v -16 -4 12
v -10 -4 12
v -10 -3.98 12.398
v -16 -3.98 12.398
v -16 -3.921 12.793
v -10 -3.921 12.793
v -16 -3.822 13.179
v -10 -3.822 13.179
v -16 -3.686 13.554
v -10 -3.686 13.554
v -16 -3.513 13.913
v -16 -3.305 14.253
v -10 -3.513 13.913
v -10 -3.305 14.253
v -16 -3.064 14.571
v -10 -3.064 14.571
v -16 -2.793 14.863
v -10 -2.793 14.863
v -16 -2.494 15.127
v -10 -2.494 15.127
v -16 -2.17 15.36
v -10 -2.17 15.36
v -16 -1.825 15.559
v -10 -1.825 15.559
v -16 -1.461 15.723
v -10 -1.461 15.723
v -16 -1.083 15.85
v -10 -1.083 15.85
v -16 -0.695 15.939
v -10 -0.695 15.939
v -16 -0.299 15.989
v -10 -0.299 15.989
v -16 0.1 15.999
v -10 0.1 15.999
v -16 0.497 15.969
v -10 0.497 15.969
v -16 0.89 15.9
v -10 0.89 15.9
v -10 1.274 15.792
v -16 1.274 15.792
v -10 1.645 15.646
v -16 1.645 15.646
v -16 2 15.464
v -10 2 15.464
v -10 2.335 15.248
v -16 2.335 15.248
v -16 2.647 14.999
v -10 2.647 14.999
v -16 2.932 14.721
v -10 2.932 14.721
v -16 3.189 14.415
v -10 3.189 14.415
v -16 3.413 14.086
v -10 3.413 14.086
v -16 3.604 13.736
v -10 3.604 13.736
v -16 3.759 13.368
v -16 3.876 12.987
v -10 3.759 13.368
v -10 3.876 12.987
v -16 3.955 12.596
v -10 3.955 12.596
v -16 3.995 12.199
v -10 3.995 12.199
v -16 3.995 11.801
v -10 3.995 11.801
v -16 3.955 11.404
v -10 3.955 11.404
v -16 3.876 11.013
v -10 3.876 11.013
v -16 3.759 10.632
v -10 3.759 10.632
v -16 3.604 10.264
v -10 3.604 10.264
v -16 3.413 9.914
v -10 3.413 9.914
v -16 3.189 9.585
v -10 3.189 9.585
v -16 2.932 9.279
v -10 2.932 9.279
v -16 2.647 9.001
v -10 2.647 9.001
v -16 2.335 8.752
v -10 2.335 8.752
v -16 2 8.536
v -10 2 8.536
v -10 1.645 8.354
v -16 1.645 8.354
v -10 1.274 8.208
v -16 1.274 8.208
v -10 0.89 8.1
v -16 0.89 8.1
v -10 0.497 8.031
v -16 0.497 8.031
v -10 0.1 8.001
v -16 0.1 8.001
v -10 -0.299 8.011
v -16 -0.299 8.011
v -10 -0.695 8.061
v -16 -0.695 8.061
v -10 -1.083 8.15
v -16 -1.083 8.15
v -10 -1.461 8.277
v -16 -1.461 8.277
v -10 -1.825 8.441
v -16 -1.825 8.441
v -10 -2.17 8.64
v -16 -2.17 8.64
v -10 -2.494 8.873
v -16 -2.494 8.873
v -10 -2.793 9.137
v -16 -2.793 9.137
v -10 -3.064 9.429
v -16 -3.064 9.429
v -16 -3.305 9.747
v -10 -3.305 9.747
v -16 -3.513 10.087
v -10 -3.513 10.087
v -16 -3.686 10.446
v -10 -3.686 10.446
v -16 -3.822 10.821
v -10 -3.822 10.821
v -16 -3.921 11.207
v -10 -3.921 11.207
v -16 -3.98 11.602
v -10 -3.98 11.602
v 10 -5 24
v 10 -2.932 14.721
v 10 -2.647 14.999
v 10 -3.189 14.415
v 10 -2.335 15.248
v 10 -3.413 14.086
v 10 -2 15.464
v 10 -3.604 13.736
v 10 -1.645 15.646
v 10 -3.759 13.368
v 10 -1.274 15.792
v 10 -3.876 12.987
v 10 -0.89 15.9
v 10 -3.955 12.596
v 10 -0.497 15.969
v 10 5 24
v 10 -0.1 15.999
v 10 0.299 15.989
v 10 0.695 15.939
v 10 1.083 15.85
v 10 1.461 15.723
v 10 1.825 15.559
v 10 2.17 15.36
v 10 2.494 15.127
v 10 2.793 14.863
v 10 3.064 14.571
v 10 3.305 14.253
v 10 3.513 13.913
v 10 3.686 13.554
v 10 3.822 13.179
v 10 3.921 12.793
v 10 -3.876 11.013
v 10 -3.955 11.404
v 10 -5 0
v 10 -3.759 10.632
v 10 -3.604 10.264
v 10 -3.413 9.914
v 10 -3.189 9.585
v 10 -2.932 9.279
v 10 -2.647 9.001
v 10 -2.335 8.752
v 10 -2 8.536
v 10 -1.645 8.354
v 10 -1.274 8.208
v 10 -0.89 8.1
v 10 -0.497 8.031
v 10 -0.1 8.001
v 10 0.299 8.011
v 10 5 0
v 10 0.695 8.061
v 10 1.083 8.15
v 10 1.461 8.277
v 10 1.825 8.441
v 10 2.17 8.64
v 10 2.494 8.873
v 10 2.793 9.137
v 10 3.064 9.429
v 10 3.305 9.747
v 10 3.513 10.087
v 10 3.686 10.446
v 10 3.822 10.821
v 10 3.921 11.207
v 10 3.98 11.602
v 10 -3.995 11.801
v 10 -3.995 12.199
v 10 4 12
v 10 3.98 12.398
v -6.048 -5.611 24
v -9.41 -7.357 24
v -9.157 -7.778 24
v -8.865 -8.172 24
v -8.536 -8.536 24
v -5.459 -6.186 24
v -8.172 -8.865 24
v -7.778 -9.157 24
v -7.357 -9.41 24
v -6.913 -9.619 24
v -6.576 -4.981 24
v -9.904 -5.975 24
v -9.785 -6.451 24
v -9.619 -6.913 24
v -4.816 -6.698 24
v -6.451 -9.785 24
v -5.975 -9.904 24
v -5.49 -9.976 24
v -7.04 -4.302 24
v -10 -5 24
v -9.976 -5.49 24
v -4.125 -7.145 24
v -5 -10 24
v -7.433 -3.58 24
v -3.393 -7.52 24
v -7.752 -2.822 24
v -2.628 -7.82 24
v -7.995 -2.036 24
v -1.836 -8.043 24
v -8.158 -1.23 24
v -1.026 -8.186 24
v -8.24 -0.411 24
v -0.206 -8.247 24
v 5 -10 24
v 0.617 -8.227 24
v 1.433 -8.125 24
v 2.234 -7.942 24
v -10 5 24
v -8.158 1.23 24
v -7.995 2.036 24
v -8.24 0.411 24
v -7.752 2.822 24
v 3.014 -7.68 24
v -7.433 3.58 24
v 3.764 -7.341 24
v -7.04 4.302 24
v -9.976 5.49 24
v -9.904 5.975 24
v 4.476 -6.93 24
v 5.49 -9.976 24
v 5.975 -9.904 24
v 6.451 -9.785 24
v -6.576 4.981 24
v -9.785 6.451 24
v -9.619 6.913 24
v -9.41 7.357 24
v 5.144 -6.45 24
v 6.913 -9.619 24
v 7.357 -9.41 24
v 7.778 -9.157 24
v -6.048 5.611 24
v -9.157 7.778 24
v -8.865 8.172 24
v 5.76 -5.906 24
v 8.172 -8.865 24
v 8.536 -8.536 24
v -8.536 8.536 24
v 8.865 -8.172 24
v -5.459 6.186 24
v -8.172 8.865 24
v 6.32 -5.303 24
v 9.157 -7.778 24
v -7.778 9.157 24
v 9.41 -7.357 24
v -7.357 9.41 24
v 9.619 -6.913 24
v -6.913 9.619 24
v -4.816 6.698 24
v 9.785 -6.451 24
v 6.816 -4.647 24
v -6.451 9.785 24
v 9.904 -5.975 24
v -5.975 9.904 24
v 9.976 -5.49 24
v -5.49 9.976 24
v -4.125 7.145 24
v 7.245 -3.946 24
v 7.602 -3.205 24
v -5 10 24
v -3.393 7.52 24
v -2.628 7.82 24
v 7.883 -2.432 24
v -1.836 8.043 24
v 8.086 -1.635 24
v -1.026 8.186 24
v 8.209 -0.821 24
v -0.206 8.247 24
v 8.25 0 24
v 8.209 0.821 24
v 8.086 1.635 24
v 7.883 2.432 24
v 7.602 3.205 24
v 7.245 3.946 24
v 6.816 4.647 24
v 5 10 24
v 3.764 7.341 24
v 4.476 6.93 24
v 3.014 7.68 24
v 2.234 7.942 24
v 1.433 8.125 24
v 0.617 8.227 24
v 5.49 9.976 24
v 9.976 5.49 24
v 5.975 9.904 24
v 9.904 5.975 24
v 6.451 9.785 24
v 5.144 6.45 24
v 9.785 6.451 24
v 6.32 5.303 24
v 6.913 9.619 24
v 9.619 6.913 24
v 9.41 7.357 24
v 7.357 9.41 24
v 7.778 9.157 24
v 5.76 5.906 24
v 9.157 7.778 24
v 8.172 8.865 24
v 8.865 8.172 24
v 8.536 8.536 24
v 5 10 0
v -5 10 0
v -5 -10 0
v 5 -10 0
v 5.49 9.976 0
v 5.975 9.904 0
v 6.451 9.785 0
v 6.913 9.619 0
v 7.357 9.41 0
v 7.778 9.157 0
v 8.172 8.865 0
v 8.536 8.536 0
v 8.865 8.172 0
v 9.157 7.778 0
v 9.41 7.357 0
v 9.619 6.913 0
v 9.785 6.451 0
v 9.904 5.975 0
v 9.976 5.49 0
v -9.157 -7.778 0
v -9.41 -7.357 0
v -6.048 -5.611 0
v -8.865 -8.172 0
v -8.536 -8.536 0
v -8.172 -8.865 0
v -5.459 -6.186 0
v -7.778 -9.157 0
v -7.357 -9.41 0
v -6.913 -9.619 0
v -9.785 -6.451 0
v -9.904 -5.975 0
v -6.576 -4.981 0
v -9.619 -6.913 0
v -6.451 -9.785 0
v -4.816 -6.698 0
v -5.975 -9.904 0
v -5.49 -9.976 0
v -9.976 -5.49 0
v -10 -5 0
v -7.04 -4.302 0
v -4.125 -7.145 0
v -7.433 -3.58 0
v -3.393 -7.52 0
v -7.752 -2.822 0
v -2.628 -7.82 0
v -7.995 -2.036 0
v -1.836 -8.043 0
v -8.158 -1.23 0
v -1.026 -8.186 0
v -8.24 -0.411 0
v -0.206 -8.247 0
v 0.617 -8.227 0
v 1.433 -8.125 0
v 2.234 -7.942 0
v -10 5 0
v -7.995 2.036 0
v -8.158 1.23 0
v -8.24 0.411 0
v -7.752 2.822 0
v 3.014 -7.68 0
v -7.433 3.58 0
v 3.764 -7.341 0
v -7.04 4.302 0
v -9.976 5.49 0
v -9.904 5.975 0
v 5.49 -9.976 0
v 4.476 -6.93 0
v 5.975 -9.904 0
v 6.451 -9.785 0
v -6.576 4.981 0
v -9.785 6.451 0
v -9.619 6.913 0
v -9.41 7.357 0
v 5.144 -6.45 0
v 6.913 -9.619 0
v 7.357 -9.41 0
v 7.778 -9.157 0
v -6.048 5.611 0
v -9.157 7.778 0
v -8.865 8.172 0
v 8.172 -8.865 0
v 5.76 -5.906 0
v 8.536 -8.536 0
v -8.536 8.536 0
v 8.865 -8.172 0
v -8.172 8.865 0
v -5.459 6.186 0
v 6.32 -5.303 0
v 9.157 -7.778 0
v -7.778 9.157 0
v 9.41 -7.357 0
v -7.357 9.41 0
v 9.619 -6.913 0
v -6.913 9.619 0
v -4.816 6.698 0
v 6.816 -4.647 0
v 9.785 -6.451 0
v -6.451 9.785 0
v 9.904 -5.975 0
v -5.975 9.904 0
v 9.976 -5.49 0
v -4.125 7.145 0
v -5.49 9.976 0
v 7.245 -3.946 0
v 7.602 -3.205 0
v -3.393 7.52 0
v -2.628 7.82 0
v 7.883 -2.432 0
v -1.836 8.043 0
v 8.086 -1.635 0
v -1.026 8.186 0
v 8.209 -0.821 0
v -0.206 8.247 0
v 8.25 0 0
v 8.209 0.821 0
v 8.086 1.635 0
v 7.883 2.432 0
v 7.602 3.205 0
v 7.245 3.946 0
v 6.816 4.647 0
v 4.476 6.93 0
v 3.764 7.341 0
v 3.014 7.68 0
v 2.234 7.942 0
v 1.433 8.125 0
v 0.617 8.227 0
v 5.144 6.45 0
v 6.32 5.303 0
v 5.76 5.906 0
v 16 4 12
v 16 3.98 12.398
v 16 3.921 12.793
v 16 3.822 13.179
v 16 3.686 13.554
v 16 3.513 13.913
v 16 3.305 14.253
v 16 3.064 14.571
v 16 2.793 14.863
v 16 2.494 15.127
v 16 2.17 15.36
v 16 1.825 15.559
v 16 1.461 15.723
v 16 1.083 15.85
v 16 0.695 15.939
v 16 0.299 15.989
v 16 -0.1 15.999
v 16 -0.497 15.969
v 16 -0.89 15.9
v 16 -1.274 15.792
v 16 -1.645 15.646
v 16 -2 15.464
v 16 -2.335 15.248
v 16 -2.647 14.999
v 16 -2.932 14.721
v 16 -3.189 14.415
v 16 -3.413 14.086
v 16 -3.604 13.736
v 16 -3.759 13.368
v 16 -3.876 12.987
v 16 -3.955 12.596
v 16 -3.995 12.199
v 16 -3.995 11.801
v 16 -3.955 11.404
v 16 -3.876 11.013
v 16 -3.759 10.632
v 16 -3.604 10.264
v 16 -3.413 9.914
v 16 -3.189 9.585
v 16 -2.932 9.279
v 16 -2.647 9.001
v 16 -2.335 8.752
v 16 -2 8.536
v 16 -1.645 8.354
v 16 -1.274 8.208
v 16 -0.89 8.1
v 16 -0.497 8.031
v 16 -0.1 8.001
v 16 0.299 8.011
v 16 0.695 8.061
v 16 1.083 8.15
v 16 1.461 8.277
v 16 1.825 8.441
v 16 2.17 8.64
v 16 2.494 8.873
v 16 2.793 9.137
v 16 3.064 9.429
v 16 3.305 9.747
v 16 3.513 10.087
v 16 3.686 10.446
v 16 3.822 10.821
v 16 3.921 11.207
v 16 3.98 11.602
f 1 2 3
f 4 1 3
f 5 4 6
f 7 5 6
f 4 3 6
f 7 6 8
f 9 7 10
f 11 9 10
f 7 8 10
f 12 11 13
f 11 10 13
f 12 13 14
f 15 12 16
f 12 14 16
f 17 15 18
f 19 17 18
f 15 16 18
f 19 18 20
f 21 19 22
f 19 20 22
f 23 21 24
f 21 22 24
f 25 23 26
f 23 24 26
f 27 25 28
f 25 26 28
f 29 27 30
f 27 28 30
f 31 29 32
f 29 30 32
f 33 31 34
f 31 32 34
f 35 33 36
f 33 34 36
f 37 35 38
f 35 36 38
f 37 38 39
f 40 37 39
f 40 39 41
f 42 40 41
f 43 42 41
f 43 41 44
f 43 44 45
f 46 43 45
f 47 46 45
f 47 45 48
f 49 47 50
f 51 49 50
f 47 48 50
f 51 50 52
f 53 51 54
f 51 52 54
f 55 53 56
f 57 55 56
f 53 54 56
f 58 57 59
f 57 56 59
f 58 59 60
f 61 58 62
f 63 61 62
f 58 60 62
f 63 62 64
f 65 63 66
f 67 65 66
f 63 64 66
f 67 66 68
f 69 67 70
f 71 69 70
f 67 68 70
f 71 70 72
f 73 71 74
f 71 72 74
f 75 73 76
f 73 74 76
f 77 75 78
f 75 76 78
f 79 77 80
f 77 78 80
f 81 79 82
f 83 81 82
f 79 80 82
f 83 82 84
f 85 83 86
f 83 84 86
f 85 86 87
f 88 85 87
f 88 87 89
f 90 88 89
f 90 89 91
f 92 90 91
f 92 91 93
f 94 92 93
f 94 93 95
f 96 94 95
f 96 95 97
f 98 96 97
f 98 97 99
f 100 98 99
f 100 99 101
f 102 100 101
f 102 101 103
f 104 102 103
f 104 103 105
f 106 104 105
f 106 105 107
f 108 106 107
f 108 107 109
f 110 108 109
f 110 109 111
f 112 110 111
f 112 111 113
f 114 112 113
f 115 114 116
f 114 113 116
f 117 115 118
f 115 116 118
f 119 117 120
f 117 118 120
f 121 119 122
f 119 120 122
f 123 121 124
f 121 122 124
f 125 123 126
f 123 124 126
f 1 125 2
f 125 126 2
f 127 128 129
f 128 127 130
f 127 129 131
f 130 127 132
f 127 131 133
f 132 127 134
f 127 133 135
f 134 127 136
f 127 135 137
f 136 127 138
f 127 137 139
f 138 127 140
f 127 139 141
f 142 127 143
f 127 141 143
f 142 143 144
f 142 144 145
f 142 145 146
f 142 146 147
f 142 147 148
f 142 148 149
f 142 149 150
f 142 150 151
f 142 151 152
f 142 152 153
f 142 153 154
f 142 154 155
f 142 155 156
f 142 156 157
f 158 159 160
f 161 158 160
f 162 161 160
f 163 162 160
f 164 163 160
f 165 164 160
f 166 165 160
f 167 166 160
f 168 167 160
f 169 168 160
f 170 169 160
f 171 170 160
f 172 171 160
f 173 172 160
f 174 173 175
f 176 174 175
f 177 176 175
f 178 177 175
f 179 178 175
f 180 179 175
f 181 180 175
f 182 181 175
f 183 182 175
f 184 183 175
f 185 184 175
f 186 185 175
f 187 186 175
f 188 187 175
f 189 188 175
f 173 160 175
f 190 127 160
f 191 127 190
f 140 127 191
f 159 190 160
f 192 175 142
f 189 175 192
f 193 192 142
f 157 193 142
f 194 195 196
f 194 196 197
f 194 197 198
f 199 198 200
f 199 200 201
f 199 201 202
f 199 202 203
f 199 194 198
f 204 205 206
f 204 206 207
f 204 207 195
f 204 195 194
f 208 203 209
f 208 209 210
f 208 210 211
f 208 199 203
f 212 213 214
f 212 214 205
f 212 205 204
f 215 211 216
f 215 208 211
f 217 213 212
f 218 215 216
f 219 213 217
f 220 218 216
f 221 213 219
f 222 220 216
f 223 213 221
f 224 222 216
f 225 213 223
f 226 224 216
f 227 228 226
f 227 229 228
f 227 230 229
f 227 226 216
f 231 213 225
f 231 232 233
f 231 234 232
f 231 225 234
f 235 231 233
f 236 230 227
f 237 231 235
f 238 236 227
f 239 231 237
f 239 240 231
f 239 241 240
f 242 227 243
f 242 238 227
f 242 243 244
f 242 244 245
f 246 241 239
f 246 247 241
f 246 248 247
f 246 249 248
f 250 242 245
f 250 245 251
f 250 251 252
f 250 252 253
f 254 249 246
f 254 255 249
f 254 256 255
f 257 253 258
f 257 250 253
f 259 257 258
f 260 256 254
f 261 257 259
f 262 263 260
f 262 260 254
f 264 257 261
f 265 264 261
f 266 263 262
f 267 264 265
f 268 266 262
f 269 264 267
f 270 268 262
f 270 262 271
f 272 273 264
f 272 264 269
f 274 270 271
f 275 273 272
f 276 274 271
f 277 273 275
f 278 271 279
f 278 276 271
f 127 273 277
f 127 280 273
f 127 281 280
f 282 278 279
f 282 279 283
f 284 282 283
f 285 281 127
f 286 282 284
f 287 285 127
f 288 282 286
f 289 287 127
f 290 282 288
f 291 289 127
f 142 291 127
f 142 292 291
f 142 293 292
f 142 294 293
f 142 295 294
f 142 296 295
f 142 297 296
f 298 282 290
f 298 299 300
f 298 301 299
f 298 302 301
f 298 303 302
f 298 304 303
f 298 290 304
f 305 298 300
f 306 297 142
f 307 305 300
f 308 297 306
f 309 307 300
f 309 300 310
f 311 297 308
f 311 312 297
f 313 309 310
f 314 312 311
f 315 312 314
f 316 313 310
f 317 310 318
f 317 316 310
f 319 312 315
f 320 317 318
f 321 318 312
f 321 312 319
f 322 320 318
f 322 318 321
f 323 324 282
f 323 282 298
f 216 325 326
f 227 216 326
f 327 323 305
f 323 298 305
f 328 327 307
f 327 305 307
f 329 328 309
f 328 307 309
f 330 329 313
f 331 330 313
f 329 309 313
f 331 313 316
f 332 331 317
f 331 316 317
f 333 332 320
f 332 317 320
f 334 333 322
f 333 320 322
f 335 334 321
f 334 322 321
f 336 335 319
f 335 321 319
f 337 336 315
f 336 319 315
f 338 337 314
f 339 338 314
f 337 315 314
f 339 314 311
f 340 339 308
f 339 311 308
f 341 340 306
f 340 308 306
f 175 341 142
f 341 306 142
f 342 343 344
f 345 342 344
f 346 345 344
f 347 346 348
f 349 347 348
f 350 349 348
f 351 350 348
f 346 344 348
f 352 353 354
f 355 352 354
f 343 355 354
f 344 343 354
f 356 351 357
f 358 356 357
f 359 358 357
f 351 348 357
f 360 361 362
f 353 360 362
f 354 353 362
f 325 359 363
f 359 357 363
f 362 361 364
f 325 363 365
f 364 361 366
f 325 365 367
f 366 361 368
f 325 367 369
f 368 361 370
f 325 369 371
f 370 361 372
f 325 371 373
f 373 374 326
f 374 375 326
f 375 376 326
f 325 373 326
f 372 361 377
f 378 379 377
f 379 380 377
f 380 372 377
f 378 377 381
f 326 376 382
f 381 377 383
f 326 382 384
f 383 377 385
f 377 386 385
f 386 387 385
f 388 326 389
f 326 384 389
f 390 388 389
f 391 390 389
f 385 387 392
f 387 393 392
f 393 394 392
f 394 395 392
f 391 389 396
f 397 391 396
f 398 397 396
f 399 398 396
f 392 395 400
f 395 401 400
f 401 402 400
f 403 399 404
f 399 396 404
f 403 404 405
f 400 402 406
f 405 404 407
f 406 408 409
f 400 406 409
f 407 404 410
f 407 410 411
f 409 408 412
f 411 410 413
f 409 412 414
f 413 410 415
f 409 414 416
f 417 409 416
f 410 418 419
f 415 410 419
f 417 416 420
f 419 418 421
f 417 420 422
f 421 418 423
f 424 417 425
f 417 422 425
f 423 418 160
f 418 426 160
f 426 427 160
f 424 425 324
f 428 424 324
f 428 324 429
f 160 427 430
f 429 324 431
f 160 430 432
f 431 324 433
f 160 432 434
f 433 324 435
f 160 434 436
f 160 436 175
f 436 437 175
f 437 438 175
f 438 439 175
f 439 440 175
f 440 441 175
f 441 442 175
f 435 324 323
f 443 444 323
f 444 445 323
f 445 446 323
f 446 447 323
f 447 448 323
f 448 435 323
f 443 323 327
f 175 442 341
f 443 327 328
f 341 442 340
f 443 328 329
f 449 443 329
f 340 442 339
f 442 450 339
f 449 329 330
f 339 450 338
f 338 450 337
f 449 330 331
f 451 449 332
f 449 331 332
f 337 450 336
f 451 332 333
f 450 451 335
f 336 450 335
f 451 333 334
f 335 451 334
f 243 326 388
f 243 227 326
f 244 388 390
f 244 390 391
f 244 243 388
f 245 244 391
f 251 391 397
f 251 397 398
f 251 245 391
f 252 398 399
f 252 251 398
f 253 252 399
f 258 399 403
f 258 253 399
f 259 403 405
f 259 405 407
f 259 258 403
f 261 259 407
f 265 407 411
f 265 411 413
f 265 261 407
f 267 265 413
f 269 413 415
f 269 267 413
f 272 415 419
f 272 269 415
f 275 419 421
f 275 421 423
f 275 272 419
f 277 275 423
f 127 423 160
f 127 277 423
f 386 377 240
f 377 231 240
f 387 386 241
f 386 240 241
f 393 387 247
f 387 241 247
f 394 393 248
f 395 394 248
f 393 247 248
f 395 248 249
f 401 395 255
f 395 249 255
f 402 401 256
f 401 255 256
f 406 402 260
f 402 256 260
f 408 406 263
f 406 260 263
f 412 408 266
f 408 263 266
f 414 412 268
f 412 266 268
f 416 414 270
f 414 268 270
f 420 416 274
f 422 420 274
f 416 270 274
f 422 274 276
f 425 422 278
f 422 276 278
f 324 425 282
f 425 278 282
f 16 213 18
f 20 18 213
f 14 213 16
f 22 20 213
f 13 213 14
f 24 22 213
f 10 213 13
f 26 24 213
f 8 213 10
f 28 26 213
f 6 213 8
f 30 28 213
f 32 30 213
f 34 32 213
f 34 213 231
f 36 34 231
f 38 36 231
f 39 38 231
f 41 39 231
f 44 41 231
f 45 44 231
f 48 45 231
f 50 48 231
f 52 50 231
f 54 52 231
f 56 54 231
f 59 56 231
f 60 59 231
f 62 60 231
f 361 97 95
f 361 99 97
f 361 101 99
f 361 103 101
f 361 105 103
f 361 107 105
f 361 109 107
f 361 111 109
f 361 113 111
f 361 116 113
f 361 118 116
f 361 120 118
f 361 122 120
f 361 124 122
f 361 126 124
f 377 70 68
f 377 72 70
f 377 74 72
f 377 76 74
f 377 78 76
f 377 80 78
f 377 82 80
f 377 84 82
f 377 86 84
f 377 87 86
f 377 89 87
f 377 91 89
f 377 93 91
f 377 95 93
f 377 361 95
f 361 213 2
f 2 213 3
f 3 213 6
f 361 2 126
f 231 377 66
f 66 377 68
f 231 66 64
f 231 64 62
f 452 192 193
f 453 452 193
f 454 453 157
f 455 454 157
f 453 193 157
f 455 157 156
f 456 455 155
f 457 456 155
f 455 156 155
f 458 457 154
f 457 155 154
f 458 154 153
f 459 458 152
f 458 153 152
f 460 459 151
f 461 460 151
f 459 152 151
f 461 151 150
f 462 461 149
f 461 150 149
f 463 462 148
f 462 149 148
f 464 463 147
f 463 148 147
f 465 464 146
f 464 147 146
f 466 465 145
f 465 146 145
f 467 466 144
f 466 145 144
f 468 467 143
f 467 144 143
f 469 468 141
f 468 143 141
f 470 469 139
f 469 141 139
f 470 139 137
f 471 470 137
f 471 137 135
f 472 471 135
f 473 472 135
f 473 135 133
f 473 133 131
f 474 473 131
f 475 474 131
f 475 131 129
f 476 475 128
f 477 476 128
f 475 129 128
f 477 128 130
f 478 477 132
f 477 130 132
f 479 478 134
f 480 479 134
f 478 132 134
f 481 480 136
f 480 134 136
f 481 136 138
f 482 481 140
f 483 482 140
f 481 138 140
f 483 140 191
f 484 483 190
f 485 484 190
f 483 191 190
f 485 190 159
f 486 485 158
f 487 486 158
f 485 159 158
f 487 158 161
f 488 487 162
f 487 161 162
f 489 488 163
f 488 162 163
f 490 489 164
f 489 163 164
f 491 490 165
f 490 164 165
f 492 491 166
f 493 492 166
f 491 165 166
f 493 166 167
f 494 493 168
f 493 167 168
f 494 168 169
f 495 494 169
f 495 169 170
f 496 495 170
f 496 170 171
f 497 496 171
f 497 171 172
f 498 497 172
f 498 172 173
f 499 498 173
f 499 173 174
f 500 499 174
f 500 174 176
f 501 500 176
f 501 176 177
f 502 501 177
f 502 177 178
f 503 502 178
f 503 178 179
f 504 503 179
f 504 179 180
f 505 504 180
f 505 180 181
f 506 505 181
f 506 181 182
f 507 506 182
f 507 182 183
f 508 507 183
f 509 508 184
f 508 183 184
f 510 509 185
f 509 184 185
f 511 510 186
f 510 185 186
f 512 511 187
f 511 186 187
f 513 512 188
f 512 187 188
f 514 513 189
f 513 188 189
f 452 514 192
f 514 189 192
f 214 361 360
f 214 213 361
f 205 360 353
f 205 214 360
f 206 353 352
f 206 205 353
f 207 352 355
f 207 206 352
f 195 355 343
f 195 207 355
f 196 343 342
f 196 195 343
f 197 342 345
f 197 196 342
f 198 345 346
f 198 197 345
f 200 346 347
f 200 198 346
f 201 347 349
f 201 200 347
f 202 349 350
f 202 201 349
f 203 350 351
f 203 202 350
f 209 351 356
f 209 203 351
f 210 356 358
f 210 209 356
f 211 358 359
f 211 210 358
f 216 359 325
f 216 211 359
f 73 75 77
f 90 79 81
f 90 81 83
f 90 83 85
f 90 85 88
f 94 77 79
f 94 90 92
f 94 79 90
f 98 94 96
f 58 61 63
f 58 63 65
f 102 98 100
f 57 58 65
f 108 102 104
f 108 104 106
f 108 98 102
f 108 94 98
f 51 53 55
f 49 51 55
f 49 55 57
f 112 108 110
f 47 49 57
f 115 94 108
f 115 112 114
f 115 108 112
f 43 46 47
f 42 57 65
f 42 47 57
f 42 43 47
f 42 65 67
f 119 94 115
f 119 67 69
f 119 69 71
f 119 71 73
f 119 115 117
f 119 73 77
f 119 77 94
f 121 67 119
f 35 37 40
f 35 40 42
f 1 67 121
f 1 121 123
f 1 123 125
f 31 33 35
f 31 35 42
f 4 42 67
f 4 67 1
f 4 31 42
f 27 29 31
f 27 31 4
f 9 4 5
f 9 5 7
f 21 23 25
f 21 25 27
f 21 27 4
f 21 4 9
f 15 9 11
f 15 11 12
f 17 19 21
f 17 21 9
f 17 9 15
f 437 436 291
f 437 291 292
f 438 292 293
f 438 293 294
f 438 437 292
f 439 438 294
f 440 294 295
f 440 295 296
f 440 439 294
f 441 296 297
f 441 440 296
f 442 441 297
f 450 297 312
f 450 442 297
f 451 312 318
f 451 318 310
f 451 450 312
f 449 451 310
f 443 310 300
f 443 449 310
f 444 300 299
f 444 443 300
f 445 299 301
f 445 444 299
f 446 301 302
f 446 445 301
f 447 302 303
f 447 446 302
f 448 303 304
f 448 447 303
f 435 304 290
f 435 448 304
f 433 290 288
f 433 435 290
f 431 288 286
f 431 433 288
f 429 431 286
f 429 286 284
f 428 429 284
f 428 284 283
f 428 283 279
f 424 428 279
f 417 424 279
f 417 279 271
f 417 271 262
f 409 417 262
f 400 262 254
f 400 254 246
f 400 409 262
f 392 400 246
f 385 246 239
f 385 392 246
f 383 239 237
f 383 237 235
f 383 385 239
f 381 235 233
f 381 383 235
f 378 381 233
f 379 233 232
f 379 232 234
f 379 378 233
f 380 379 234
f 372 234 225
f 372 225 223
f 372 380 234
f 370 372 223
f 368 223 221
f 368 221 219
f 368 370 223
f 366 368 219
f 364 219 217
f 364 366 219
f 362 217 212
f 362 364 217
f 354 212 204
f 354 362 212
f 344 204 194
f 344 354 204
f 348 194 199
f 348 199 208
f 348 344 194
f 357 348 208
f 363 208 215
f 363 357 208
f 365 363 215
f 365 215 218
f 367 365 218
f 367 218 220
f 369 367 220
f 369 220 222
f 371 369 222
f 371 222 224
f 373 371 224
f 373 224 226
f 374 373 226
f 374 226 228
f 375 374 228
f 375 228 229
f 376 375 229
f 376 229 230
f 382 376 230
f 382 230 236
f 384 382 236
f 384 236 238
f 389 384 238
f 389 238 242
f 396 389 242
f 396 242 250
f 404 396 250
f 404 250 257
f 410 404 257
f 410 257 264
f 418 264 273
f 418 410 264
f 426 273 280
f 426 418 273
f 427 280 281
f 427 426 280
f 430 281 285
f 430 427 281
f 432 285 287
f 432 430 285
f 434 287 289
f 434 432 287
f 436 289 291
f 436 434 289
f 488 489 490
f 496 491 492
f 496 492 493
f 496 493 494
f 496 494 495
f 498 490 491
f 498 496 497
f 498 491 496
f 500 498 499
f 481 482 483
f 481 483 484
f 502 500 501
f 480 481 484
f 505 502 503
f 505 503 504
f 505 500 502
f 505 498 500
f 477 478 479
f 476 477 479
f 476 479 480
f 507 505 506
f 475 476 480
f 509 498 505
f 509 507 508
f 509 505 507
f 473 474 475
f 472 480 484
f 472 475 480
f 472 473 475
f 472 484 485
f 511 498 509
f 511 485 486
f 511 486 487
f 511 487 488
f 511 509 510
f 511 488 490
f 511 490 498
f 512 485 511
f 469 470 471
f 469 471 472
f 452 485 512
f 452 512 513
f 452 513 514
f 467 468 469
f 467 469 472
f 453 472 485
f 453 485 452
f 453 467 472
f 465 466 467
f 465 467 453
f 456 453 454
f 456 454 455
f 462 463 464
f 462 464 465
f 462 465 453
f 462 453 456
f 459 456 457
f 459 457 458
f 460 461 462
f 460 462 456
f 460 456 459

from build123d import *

# Parameters (mm, degrees)
F0_W     = 20
F0_H     = 20
F0_R     = 8.25
F1_DEPTH = 24
F2_R     = 5
F3_R     = 4
F4_DEPTH = 6
F5_R     = 4
F6_DEPTH = 6


with BuildPart() as f1:
    # F0 (on Top) → F1 (new body)
    with BuildSketch(Plane.XY):
        Rectangle(F0_W, F0_H)
        Circle(F0_R, mode=Mode.SUBTRACT)
    extrude(amount=F1_DEPTH)

    # F2
    f2_edges = [f1.edges().sort_by_distance(p)[0] for p in [
        (10, 10, 12),
        (10, -10, 12),
        (-10, 10, 12),
        (-10, -10, 12),
    ]]
    fillet(f2_edges, radius=F2_R)

    # F3 (on face) → F4 (join)
    with BuildSketch(Plane.YZ.offset(10)):
        with Locations((0, 12)):
            Circle(F3_R)
    extrude(amount=F4_DEPTH)

    # F5 (on face) → F6 (join)
    with BuildSketch(Plane(origin=(-10, 0, 0), x_dir=(0, -1, 0), z_dir=(-1, 0, 0))):
        with Locations((0, 12)):
            Circle(F5_R)
    extrude(amount=F6_DEPTH)


solid = f1.part
